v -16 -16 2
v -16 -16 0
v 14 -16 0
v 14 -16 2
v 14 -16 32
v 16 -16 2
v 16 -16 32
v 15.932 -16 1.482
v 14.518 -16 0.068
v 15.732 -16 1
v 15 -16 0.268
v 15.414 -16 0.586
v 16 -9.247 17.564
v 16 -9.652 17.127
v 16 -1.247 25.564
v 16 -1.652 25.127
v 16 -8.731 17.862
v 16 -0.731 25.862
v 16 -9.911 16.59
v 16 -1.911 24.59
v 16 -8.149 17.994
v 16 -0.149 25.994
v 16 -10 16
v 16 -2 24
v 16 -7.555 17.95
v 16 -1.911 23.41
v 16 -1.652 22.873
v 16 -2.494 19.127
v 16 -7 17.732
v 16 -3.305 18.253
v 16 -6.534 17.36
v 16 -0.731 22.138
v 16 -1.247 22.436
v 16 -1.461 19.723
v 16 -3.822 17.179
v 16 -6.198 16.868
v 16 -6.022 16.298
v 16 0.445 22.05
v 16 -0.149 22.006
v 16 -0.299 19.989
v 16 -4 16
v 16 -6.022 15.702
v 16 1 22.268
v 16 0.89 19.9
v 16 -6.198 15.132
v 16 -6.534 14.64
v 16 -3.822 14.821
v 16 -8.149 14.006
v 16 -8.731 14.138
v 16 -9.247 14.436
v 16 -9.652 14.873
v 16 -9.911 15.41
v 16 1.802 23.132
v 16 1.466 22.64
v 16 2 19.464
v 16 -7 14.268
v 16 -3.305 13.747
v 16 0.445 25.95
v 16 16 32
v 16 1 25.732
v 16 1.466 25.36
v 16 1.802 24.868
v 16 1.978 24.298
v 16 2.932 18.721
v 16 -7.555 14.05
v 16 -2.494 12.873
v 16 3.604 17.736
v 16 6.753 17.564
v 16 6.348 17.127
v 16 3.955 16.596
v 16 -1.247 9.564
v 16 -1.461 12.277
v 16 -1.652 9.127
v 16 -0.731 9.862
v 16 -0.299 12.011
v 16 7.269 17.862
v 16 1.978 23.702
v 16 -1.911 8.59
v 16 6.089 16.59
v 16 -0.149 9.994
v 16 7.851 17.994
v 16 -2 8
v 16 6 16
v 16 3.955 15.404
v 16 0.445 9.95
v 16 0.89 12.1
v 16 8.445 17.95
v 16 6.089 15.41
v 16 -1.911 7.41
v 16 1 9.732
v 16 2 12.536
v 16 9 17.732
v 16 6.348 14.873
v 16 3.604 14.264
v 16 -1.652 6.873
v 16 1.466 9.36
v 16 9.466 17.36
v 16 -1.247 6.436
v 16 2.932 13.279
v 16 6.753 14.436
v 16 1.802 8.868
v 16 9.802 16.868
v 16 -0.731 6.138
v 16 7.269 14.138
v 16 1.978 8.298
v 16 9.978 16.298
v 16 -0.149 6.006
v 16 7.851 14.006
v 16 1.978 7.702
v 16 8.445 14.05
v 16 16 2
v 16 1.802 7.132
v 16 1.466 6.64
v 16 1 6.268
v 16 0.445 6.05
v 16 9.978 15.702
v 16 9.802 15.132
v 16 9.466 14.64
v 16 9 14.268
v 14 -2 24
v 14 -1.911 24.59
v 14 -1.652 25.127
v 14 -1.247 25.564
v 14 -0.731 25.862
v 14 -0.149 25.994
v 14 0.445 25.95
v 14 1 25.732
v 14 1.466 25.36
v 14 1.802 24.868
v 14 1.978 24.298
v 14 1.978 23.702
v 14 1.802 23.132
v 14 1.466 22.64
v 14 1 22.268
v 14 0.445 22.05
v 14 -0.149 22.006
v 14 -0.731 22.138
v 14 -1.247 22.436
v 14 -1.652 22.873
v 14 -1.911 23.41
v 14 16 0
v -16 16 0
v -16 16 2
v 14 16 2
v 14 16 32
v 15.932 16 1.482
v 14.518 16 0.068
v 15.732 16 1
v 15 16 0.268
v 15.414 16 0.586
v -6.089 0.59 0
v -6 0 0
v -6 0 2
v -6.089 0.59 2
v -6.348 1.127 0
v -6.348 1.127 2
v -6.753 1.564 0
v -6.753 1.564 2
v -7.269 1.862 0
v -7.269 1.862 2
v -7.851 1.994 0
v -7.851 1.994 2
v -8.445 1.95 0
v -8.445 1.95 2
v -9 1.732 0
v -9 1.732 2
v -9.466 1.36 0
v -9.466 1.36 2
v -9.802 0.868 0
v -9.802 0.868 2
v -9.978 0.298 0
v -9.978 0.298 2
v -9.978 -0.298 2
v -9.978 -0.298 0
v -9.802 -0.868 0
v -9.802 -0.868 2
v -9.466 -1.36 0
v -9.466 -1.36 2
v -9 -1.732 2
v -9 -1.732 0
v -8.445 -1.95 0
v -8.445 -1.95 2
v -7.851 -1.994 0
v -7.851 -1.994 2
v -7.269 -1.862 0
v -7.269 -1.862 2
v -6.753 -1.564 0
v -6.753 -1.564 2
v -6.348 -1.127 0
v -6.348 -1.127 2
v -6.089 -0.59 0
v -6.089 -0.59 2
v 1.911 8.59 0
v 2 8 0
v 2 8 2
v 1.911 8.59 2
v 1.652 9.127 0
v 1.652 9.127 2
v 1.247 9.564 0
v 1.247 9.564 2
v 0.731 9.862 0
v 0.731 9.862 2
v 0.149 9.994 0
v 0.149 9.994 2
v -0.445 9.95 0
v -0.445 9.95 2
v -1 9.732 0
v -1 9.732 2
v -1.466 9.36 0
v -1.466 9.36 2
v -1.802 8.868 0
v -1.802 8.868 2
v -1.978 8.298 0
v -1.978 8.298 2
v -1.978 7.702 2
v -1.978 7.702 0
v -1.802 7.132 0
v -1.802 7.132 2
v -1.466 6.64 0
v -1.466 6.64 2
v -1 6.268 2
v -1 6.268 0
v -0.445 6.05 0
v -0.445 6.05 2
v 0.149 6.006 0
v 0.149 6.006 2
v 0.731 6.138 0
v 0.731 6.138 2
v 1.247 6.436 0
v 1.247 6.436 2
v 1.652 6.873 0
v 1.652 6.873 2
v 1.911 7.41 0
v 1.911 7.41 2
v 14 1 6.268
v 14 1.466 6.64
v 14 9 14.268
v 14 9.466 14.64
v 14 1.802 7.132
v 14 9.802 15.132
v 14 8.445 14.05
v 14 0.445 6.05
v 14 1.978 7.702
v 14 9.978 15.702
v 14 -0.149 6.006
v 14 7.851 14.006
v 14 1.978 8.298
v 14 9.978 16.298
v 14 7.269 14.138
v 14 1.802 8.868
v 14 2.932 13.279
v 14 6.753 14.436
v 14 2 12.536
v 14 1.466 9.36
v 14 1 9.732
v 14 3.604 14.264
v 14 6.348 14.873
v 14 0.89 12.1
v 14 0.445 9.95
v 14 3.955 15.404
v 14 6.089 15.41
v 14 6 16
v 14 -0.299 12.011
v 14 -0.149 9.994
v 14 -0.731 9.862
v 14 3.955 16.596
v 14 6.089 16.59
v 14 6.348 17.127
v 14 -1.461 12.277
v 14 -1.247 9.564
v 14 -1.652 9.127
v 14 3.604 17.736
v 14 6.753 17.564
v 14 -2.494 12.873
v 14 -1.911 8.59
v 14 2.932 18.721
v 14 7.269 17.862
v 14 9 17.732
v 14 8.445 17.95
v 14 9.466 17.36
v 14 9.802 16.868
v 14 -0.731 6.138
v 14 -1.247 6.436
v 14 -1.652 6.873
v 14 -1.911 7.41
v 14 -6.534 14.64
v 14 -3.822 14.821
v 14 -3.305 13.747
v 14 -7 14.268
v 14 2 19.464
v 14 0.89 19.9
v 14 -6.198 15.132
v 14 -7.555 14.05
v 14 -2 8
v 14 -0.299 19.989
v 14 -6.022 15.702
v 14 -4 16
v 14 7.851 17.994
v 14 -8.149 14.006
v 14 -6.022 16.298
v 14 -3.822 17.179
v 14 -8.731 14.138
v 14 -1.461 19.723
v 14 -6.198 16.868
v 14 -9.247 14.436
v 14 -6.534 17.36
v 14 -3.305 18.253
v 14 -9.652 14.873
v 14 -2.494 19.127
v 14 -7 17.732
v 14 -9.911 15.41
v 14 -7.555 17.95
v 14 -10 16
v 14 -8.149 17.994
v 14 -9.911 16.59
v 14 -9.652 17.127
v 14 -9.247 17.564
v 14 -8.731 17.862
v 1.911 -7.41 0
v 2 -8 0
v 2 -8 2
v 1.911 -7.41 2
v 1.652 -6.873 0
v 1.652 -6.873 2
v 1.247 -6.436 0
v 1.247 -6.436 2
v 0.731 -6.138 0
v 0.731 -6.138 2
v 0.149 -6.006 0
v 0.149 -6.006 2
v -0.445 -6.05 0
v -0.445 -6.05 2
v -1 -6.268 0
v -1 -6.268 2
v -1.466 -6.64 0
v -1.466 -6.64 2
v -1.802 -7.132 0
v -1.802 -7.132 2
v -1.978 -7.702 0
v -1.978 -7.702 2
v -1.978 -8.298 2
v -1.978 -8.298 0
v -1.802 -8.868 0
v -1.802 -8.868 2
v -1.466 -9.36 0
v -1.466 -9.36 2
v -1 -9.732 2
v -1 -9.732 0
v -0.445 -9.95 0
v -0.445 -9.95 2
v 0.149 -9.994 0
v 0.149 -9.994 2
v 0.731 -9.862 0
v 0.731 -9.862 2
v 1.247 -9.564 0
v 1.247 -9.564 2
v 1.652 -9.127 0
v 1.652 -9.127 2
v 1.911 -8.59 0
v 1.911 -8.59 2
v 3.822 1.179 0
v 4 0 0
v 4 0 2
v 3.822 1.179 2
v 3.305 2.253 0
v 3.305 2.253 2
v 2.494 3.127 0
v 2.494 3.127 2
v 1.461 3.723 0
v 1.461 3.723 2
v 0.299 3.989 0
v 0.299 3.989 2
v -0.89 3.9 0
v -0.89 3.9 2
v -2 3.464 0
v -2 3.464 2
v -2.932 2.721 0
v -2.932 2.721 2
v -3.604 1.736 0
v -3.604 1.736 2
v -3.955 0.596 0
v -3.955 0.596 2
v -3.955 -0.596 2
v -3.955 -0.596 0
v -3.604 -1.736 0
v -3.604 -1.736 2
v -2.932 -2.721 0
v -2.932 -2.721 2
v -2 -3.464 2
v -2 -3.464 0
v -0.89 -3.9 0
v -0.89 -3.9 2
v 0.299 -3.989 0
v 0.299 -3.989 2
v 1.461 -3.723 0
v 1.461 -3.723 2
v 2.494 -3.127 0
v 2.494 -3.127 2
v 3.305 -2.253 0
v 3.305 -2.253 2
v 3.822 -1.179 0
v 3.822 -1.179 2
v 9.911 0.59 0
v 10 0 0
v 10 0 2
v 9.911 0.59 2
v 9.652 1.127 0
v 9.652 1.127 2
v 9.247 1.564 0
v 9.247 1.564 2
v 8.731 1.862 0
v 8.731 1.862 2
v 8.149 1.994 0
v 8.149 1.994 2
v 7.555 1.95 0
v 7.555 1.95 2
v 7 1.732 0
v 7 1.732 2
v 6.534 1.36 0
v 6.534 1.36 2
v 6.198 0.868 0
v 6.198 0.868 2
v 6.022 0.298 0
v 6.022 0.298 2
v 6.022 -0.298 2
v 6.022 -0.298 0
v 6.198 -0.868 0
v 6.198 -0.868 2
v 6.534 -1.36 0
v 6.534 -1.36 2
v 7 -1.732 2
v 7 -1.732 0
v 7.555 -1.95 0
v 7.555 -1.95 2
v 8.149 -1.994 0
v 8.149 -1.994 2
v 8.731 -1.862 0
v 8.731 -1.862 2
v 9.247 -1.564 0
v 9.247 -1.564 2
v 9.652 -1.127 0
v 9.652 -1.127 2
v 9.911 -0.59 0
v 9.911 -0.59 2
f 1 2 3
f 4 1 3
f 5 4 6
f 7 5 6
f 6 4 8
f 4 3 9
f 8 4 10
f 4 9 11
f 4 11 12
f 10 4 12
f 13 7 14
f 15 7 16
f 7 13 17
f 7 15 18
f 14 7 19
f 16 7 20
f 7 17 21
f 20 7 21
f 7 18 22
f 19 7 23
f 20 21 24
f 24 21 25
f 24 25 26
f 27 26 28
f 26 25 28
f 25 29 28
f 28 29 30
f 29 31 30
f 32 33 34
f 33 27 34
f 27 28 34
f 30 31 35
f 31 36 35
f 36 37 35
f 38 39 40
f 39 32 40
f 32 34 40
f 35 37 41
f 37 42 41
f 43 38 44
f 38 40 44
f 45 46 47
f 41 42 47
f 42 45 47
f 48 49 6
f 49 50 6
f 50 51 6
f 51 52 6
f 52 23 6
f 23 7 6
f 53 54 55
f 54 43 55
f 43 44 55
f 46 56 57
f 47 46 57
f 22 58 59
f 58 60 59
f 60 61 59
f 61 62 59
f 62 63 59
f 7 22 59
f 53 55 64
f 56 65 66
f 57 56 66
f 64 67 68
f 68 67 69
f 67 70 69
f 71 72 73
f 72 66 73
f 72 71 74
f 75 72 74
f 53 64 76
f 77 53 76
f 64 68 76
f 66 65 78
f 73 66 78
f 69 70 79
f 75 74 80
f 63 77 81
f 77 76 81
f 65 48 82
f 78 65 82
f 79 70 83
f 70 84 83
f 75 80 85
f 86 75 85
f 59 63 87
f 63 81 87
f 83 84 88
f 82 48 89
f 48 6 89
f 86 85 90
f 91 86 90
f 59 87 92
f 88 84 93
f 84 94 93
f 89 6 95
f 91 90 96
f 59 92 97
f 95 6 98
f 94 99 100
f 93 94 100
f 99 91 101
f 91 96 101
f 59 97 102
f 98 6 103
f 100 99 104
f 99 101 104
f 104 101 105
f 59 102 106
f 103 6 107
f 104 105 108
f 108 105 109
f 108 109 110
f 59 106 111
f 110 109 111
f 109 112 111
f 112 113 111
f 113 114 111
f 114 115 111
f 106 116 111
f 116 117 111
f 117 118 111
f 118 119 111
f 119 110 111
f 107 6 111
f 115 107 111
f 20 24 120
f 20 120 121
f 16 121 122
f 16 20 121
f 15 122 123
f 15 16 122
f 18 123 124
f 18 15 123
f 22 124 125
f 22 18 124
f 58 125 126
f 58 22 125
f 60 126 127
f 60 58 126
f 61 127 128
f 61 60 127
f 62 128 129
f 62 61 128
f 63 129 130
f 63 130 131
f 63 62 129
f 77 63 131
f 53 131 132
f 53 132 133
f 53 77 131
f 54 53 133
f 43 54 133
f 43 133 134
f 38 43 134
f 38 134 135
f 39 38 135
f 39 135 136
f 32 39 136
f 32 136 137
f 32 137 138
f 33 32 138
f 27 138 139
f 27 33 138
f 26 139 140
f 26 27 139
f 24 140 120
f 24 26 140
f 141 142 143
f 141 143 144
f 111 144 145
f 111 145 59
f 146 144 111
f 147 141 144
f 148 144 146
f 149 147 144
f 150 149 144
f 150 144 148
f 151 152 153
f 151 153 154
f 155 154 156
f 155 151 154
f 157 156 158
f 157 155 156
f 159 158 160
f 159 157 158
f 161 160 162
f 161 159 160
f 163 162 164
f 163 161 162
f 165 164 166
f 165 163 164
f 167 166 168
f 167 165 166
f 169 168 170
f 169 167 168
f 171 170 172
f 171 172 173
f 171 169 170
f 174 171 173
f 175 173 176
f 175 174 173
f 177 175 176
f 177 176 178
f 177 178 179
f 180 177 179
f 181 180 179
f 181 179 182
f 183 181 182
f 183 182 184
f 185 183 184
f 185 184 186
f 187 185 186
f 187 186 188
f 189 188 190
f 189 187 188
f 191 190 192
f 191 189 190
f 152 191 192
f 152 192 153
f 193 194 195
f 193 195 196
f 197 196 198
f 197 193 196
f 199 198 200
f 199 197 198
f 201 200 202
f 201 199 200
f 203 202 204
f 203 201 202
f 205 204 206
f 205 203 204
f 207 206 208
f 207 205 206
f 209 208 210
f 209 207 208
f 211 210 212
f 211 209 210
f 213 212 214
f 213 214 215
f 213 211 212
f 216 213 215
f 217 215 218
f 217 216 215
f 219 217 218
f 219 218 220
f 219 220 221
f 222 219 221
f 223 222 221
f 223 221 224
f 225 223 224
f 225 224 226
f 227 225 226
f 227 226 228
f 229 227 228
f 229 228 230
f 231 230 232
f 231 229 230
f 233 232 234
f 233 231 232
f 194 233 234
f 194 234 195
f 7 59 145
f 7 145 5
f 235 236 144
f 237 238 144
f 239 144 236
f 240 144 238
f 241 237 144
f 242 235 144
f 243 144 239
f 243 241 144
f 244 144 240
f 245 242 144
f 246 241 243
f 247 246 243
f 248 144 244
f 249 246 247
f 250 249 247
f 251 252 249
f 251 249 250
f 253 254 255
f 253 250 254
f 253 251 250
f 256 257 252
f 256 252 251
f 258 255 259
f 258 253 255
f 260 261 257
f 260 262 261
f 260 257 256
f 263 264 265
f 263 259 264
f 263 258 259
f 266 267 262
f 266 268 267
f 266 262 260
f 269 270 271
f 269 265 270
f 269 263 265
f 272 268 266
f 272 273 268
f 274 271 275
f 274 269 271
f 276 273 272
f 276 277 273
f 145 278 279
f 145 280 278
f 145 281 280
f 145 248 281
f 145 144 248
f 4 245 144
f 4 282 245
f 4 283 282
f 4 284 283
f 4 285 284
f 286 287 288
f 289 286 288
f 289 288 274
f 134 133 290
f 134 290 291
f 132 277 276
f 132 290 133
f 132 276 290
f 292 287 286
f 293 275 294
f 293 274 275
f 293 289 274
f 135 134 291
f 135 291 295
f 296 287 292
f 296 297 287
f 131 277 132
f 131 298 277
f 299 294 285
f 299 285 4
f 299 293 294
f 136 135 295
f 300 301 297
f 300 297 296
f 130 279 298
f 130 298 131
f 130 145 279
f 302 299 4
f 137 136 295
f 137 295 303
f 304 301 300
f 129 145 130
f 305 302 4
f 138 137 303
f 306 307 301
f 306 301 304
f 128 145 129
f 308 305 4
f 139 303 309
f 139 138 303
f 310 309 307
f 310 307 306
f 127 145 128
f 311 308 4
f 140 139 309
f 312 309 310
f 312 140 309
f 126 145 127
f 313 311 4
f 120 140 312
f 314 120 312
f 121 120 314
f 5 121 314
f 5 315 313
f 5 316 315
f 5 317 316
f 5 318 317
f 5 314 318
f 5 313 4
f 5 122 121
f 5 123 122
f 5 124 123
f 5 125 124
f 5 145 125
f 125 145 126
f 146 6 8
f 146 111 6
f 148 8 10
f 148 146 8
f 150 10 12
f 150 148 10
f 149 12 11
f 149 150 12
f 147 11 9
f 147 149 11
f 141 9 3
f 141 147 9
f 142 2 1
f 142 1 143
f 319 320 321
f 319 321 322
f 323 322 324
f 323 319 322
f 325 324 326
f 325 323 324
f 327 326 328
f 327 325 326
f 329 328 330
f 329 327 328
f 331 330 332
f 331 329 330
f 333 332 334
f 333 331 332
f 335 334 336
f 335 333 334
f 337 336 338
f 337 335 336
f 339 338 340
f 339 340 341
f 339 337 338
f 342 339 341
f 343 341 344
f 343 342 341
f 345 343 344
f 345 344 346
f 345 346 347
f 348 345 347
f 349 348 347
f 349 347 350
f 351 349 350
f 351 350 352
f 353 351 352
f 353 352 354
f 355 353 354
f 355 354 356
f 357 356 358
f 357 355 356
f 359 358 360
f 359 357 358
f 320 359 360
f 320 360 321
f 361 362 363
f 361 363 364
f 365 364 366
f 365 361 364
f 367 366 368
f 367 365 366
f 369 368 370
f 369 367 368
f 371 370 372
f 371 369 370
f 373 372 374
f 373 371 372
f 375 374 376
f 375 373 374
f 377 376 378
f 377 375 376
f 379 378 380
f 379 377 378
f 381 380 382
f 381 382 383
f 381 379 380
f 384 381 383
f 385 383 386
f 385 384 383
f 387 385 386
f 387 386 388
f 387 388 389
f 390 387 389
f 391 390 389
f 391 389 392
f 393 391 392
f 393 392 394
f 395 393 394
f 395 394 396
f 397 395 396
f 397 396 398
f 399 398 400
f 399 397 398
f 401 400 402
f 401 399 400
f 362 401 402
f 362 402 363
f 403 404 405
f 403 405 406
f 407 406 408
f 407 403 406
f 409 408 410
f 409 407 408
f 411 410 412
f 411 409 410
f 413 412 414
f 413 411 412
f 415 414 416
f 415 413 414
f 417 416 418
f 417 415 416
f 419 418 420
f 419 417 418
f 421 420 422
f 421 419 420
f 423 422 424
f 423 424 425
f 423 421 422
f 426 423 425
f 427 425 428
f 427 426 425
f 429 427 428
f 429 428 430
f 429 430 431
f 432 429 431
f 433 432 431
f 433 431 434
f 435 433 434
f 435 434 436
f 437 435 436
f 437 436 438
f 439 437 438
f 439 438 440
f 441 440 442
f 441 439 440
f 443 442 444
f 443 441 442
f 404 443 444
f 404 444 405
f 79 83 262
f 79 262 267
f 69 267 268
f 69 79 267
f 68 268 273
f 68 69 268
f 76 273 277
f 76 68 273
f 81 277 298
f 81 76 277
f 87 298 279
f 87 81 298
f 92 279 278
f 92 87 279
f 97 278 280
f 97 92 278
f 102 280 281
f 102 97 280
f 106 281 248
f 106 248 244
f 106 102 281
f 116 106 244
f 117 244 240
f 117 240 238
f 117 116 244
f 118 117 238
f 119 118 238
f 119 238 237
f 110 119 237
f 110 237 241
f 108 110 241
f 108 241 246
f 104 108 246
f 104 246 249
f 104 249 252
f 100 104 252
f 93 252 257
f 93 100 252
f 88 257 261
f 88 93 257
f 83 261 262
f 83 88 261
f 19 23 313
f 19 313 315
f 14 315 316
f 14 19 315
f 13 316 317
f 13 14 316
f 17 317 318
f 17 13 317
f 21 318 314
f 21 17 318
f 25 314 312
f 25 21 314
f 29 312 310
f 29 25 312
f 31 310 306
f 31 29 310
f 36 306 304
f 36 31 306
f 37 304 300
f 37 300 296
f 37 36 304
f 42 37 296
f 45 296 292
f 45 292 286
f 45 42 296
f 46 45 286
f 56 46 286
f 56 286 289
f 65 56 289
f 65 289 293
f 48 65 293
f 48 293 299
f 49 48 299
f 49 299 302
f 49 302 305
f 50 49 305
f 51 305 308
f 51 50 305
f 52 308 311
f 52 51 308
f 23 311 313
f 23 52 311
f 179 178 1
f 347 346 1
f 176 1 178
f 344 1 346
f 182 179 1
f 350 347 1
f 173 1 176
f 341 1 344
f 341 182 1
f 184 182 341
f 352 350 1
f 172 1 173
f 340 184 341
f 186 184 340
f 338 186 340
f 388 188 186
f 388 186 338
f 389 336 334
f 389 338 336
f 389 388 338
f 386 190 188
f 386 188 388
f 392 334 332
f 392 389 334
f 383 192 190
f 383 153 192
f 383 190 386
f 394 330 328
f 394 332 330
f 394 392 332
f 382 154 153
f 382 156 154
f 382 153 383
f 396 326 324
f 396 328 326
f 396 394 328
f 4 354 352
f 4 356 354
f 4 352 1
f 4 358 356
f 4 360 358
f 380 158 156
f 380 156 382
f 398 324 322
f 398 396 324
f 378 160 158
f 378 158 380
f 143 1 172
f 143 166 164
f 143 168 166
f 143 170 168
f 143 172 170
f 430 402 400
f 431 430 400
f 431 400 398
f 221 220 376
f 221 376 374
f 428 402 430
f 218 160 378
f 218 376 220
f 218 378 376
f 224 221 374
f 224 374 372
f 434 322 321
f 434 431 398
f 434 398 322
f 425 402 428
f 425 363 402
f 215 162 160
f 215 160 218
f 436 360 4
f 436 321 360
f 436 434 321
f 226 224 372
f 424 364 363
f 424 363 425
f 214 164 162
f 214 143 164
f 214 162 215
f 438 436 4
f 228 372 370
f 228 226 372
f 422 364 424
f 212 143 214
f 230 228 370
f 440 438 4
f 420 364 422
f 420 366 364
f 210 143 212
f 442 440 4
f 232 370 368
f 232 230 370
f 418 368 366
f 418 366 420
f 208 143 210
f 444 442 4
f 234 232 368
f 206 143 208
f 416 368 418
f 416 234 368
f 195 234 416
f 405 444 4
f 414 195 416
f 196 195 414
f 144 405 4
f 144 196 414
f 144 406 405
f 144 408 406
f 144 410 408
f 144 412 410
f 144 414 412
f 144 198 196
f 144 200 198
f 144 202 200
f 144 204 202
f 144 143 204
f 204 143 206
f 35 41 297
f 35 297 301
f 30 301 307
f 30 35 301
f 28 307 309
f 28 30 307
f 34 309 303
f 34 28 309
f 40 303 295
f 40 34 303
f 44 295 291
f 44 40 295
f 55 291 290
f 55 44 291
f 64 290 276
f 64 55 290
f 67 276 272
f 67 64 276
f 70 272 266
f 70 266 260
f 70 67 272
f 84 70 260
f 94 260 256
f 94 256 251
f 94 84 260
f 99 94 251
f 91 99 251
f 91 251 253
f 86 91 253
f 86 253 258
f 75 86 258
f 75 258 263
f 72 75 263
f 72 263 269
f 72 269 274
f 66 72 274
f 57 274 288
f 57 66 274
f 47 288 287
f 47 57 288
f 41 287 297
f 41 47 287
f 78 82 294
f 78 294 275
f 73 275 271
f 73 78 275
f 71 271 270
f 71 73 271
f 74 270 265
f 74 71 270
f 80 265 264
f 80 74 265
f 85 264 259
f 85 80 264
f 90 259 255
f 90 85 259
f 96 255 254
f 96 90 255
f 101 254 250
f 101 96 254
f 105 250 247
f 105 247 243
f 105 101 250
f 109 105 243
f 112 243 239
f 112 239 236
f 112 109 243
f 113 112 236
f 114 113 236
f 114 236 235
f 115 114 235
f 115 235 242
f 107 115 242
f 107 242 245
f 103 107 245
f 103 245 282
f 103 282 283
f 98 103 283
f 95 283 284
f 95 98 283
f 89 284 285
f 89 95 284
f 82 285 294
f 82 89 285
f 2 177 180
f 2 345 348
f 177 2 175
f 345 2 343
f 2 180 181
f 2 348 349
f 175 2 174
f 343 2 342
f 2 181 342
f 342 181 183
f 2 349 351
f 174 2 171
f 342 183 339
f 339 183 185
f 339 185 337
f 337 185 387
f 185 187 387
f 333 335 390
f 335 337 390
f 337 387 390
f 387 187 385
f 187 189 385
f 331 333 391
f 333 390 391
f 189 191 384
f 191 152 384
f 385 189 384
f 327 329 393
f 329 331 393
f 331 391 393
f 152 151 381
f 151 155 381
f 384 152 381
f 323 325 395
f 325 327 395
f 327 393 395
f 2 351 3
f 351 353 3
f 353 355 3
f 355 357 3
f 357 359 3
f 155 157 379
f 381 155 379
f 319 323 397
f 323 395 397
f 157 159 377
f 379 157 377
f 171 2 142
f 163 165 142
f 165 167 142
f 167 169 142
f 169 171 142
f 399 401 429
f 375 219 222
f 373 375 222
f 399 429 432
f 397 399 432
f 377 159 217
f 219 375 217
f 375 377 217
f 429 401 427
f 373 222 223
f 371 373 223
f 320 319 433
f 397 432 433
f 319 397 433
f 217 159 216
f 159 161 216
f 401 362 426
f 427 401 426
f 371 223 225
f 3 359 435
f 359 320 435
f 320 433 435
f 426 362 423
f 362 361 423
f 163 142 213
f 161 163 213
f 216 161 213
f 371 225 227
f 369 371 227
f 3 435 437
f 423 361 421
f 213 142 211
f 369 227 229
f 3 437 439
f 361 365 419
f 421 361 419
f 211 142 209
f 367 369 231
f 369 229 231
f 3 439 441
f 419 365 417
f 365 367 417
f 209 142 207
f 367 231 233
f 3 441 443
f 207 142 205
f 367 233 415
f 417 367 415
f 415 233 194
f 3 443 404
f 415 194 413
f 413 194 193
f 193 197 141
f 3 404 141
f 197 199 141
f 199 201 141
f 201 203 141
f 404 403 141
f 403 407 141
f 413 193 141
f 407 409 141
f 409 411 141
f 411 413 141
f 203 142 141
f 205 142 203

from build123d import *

# Parameters (mm, degrees)
F0_W     = 32
F0_H     = 32
F0_R     = 2
F0_R_2   = 4
F3_DEPTH = 2
F2_W     = 32
F2_H     = 32
F2_R     = 2
F2_R_2   = 4
F4_DEPTH = 2
F5_R     = 2


with BuildPart() as f3:
    # F0 (on Top) → F3 (new body)
    with BuildSketch(Plane.XY):
        Rectangle(F0_W, F0_H)
        with Locations((0, -8)):
            Circle(F0_R, mode=Mode.SUBTRACT)
        with Locations((-8, 0)):
            Circle(F0_R, mode=Mode.SUBTRACT)
        Circle(F0_R_2, mode=Mode.SUBTRACT)
        with Locations((8, 0)):
            Circle(F0_R, mode=Mode.SUBTRACT)
        with Locations((0, 8)):
            Circle(F0_R, mode=Mode.SUBTRACT)
    extrude(amount=F3_DEPTH)

    # F2 (on face) → F4 (join)
    with BuildSketch(Plane(origin=(16, 0, 0), x_dir=(0, -1, 0), z_dir=(-1, 0, 0))):
        with Locations((0, 16)):
            Rectangle(F2_W, F2_H)
        with Locations((0, 8)):
            Circle(F2_R, mode=Mode.SUBTRACT)
        with Locations((-8, 16)):
            Circle(F2_R, mode=Mode.SUBTRACT)
        with Locations((0, 16)):
            Circle(F2_R_2, mode=Mode.SUBTRACT)
        with Locations((8, 16)):
            Circle(F2_R, mode=Mode.SUBTRACT)
        with Locations((0, 24)):
            Circle(F2_R, mode=Mode.SUBTRACT)
    extrude(amount=F4_DEPTH)

    # F5
    f5_edges = [f3.edges().sort_by_distance(p)[0] for p in [
        (16, 0, 0),
    ]]
    fillet(f5_edges, radius=F5_R)


solid = f3.part
